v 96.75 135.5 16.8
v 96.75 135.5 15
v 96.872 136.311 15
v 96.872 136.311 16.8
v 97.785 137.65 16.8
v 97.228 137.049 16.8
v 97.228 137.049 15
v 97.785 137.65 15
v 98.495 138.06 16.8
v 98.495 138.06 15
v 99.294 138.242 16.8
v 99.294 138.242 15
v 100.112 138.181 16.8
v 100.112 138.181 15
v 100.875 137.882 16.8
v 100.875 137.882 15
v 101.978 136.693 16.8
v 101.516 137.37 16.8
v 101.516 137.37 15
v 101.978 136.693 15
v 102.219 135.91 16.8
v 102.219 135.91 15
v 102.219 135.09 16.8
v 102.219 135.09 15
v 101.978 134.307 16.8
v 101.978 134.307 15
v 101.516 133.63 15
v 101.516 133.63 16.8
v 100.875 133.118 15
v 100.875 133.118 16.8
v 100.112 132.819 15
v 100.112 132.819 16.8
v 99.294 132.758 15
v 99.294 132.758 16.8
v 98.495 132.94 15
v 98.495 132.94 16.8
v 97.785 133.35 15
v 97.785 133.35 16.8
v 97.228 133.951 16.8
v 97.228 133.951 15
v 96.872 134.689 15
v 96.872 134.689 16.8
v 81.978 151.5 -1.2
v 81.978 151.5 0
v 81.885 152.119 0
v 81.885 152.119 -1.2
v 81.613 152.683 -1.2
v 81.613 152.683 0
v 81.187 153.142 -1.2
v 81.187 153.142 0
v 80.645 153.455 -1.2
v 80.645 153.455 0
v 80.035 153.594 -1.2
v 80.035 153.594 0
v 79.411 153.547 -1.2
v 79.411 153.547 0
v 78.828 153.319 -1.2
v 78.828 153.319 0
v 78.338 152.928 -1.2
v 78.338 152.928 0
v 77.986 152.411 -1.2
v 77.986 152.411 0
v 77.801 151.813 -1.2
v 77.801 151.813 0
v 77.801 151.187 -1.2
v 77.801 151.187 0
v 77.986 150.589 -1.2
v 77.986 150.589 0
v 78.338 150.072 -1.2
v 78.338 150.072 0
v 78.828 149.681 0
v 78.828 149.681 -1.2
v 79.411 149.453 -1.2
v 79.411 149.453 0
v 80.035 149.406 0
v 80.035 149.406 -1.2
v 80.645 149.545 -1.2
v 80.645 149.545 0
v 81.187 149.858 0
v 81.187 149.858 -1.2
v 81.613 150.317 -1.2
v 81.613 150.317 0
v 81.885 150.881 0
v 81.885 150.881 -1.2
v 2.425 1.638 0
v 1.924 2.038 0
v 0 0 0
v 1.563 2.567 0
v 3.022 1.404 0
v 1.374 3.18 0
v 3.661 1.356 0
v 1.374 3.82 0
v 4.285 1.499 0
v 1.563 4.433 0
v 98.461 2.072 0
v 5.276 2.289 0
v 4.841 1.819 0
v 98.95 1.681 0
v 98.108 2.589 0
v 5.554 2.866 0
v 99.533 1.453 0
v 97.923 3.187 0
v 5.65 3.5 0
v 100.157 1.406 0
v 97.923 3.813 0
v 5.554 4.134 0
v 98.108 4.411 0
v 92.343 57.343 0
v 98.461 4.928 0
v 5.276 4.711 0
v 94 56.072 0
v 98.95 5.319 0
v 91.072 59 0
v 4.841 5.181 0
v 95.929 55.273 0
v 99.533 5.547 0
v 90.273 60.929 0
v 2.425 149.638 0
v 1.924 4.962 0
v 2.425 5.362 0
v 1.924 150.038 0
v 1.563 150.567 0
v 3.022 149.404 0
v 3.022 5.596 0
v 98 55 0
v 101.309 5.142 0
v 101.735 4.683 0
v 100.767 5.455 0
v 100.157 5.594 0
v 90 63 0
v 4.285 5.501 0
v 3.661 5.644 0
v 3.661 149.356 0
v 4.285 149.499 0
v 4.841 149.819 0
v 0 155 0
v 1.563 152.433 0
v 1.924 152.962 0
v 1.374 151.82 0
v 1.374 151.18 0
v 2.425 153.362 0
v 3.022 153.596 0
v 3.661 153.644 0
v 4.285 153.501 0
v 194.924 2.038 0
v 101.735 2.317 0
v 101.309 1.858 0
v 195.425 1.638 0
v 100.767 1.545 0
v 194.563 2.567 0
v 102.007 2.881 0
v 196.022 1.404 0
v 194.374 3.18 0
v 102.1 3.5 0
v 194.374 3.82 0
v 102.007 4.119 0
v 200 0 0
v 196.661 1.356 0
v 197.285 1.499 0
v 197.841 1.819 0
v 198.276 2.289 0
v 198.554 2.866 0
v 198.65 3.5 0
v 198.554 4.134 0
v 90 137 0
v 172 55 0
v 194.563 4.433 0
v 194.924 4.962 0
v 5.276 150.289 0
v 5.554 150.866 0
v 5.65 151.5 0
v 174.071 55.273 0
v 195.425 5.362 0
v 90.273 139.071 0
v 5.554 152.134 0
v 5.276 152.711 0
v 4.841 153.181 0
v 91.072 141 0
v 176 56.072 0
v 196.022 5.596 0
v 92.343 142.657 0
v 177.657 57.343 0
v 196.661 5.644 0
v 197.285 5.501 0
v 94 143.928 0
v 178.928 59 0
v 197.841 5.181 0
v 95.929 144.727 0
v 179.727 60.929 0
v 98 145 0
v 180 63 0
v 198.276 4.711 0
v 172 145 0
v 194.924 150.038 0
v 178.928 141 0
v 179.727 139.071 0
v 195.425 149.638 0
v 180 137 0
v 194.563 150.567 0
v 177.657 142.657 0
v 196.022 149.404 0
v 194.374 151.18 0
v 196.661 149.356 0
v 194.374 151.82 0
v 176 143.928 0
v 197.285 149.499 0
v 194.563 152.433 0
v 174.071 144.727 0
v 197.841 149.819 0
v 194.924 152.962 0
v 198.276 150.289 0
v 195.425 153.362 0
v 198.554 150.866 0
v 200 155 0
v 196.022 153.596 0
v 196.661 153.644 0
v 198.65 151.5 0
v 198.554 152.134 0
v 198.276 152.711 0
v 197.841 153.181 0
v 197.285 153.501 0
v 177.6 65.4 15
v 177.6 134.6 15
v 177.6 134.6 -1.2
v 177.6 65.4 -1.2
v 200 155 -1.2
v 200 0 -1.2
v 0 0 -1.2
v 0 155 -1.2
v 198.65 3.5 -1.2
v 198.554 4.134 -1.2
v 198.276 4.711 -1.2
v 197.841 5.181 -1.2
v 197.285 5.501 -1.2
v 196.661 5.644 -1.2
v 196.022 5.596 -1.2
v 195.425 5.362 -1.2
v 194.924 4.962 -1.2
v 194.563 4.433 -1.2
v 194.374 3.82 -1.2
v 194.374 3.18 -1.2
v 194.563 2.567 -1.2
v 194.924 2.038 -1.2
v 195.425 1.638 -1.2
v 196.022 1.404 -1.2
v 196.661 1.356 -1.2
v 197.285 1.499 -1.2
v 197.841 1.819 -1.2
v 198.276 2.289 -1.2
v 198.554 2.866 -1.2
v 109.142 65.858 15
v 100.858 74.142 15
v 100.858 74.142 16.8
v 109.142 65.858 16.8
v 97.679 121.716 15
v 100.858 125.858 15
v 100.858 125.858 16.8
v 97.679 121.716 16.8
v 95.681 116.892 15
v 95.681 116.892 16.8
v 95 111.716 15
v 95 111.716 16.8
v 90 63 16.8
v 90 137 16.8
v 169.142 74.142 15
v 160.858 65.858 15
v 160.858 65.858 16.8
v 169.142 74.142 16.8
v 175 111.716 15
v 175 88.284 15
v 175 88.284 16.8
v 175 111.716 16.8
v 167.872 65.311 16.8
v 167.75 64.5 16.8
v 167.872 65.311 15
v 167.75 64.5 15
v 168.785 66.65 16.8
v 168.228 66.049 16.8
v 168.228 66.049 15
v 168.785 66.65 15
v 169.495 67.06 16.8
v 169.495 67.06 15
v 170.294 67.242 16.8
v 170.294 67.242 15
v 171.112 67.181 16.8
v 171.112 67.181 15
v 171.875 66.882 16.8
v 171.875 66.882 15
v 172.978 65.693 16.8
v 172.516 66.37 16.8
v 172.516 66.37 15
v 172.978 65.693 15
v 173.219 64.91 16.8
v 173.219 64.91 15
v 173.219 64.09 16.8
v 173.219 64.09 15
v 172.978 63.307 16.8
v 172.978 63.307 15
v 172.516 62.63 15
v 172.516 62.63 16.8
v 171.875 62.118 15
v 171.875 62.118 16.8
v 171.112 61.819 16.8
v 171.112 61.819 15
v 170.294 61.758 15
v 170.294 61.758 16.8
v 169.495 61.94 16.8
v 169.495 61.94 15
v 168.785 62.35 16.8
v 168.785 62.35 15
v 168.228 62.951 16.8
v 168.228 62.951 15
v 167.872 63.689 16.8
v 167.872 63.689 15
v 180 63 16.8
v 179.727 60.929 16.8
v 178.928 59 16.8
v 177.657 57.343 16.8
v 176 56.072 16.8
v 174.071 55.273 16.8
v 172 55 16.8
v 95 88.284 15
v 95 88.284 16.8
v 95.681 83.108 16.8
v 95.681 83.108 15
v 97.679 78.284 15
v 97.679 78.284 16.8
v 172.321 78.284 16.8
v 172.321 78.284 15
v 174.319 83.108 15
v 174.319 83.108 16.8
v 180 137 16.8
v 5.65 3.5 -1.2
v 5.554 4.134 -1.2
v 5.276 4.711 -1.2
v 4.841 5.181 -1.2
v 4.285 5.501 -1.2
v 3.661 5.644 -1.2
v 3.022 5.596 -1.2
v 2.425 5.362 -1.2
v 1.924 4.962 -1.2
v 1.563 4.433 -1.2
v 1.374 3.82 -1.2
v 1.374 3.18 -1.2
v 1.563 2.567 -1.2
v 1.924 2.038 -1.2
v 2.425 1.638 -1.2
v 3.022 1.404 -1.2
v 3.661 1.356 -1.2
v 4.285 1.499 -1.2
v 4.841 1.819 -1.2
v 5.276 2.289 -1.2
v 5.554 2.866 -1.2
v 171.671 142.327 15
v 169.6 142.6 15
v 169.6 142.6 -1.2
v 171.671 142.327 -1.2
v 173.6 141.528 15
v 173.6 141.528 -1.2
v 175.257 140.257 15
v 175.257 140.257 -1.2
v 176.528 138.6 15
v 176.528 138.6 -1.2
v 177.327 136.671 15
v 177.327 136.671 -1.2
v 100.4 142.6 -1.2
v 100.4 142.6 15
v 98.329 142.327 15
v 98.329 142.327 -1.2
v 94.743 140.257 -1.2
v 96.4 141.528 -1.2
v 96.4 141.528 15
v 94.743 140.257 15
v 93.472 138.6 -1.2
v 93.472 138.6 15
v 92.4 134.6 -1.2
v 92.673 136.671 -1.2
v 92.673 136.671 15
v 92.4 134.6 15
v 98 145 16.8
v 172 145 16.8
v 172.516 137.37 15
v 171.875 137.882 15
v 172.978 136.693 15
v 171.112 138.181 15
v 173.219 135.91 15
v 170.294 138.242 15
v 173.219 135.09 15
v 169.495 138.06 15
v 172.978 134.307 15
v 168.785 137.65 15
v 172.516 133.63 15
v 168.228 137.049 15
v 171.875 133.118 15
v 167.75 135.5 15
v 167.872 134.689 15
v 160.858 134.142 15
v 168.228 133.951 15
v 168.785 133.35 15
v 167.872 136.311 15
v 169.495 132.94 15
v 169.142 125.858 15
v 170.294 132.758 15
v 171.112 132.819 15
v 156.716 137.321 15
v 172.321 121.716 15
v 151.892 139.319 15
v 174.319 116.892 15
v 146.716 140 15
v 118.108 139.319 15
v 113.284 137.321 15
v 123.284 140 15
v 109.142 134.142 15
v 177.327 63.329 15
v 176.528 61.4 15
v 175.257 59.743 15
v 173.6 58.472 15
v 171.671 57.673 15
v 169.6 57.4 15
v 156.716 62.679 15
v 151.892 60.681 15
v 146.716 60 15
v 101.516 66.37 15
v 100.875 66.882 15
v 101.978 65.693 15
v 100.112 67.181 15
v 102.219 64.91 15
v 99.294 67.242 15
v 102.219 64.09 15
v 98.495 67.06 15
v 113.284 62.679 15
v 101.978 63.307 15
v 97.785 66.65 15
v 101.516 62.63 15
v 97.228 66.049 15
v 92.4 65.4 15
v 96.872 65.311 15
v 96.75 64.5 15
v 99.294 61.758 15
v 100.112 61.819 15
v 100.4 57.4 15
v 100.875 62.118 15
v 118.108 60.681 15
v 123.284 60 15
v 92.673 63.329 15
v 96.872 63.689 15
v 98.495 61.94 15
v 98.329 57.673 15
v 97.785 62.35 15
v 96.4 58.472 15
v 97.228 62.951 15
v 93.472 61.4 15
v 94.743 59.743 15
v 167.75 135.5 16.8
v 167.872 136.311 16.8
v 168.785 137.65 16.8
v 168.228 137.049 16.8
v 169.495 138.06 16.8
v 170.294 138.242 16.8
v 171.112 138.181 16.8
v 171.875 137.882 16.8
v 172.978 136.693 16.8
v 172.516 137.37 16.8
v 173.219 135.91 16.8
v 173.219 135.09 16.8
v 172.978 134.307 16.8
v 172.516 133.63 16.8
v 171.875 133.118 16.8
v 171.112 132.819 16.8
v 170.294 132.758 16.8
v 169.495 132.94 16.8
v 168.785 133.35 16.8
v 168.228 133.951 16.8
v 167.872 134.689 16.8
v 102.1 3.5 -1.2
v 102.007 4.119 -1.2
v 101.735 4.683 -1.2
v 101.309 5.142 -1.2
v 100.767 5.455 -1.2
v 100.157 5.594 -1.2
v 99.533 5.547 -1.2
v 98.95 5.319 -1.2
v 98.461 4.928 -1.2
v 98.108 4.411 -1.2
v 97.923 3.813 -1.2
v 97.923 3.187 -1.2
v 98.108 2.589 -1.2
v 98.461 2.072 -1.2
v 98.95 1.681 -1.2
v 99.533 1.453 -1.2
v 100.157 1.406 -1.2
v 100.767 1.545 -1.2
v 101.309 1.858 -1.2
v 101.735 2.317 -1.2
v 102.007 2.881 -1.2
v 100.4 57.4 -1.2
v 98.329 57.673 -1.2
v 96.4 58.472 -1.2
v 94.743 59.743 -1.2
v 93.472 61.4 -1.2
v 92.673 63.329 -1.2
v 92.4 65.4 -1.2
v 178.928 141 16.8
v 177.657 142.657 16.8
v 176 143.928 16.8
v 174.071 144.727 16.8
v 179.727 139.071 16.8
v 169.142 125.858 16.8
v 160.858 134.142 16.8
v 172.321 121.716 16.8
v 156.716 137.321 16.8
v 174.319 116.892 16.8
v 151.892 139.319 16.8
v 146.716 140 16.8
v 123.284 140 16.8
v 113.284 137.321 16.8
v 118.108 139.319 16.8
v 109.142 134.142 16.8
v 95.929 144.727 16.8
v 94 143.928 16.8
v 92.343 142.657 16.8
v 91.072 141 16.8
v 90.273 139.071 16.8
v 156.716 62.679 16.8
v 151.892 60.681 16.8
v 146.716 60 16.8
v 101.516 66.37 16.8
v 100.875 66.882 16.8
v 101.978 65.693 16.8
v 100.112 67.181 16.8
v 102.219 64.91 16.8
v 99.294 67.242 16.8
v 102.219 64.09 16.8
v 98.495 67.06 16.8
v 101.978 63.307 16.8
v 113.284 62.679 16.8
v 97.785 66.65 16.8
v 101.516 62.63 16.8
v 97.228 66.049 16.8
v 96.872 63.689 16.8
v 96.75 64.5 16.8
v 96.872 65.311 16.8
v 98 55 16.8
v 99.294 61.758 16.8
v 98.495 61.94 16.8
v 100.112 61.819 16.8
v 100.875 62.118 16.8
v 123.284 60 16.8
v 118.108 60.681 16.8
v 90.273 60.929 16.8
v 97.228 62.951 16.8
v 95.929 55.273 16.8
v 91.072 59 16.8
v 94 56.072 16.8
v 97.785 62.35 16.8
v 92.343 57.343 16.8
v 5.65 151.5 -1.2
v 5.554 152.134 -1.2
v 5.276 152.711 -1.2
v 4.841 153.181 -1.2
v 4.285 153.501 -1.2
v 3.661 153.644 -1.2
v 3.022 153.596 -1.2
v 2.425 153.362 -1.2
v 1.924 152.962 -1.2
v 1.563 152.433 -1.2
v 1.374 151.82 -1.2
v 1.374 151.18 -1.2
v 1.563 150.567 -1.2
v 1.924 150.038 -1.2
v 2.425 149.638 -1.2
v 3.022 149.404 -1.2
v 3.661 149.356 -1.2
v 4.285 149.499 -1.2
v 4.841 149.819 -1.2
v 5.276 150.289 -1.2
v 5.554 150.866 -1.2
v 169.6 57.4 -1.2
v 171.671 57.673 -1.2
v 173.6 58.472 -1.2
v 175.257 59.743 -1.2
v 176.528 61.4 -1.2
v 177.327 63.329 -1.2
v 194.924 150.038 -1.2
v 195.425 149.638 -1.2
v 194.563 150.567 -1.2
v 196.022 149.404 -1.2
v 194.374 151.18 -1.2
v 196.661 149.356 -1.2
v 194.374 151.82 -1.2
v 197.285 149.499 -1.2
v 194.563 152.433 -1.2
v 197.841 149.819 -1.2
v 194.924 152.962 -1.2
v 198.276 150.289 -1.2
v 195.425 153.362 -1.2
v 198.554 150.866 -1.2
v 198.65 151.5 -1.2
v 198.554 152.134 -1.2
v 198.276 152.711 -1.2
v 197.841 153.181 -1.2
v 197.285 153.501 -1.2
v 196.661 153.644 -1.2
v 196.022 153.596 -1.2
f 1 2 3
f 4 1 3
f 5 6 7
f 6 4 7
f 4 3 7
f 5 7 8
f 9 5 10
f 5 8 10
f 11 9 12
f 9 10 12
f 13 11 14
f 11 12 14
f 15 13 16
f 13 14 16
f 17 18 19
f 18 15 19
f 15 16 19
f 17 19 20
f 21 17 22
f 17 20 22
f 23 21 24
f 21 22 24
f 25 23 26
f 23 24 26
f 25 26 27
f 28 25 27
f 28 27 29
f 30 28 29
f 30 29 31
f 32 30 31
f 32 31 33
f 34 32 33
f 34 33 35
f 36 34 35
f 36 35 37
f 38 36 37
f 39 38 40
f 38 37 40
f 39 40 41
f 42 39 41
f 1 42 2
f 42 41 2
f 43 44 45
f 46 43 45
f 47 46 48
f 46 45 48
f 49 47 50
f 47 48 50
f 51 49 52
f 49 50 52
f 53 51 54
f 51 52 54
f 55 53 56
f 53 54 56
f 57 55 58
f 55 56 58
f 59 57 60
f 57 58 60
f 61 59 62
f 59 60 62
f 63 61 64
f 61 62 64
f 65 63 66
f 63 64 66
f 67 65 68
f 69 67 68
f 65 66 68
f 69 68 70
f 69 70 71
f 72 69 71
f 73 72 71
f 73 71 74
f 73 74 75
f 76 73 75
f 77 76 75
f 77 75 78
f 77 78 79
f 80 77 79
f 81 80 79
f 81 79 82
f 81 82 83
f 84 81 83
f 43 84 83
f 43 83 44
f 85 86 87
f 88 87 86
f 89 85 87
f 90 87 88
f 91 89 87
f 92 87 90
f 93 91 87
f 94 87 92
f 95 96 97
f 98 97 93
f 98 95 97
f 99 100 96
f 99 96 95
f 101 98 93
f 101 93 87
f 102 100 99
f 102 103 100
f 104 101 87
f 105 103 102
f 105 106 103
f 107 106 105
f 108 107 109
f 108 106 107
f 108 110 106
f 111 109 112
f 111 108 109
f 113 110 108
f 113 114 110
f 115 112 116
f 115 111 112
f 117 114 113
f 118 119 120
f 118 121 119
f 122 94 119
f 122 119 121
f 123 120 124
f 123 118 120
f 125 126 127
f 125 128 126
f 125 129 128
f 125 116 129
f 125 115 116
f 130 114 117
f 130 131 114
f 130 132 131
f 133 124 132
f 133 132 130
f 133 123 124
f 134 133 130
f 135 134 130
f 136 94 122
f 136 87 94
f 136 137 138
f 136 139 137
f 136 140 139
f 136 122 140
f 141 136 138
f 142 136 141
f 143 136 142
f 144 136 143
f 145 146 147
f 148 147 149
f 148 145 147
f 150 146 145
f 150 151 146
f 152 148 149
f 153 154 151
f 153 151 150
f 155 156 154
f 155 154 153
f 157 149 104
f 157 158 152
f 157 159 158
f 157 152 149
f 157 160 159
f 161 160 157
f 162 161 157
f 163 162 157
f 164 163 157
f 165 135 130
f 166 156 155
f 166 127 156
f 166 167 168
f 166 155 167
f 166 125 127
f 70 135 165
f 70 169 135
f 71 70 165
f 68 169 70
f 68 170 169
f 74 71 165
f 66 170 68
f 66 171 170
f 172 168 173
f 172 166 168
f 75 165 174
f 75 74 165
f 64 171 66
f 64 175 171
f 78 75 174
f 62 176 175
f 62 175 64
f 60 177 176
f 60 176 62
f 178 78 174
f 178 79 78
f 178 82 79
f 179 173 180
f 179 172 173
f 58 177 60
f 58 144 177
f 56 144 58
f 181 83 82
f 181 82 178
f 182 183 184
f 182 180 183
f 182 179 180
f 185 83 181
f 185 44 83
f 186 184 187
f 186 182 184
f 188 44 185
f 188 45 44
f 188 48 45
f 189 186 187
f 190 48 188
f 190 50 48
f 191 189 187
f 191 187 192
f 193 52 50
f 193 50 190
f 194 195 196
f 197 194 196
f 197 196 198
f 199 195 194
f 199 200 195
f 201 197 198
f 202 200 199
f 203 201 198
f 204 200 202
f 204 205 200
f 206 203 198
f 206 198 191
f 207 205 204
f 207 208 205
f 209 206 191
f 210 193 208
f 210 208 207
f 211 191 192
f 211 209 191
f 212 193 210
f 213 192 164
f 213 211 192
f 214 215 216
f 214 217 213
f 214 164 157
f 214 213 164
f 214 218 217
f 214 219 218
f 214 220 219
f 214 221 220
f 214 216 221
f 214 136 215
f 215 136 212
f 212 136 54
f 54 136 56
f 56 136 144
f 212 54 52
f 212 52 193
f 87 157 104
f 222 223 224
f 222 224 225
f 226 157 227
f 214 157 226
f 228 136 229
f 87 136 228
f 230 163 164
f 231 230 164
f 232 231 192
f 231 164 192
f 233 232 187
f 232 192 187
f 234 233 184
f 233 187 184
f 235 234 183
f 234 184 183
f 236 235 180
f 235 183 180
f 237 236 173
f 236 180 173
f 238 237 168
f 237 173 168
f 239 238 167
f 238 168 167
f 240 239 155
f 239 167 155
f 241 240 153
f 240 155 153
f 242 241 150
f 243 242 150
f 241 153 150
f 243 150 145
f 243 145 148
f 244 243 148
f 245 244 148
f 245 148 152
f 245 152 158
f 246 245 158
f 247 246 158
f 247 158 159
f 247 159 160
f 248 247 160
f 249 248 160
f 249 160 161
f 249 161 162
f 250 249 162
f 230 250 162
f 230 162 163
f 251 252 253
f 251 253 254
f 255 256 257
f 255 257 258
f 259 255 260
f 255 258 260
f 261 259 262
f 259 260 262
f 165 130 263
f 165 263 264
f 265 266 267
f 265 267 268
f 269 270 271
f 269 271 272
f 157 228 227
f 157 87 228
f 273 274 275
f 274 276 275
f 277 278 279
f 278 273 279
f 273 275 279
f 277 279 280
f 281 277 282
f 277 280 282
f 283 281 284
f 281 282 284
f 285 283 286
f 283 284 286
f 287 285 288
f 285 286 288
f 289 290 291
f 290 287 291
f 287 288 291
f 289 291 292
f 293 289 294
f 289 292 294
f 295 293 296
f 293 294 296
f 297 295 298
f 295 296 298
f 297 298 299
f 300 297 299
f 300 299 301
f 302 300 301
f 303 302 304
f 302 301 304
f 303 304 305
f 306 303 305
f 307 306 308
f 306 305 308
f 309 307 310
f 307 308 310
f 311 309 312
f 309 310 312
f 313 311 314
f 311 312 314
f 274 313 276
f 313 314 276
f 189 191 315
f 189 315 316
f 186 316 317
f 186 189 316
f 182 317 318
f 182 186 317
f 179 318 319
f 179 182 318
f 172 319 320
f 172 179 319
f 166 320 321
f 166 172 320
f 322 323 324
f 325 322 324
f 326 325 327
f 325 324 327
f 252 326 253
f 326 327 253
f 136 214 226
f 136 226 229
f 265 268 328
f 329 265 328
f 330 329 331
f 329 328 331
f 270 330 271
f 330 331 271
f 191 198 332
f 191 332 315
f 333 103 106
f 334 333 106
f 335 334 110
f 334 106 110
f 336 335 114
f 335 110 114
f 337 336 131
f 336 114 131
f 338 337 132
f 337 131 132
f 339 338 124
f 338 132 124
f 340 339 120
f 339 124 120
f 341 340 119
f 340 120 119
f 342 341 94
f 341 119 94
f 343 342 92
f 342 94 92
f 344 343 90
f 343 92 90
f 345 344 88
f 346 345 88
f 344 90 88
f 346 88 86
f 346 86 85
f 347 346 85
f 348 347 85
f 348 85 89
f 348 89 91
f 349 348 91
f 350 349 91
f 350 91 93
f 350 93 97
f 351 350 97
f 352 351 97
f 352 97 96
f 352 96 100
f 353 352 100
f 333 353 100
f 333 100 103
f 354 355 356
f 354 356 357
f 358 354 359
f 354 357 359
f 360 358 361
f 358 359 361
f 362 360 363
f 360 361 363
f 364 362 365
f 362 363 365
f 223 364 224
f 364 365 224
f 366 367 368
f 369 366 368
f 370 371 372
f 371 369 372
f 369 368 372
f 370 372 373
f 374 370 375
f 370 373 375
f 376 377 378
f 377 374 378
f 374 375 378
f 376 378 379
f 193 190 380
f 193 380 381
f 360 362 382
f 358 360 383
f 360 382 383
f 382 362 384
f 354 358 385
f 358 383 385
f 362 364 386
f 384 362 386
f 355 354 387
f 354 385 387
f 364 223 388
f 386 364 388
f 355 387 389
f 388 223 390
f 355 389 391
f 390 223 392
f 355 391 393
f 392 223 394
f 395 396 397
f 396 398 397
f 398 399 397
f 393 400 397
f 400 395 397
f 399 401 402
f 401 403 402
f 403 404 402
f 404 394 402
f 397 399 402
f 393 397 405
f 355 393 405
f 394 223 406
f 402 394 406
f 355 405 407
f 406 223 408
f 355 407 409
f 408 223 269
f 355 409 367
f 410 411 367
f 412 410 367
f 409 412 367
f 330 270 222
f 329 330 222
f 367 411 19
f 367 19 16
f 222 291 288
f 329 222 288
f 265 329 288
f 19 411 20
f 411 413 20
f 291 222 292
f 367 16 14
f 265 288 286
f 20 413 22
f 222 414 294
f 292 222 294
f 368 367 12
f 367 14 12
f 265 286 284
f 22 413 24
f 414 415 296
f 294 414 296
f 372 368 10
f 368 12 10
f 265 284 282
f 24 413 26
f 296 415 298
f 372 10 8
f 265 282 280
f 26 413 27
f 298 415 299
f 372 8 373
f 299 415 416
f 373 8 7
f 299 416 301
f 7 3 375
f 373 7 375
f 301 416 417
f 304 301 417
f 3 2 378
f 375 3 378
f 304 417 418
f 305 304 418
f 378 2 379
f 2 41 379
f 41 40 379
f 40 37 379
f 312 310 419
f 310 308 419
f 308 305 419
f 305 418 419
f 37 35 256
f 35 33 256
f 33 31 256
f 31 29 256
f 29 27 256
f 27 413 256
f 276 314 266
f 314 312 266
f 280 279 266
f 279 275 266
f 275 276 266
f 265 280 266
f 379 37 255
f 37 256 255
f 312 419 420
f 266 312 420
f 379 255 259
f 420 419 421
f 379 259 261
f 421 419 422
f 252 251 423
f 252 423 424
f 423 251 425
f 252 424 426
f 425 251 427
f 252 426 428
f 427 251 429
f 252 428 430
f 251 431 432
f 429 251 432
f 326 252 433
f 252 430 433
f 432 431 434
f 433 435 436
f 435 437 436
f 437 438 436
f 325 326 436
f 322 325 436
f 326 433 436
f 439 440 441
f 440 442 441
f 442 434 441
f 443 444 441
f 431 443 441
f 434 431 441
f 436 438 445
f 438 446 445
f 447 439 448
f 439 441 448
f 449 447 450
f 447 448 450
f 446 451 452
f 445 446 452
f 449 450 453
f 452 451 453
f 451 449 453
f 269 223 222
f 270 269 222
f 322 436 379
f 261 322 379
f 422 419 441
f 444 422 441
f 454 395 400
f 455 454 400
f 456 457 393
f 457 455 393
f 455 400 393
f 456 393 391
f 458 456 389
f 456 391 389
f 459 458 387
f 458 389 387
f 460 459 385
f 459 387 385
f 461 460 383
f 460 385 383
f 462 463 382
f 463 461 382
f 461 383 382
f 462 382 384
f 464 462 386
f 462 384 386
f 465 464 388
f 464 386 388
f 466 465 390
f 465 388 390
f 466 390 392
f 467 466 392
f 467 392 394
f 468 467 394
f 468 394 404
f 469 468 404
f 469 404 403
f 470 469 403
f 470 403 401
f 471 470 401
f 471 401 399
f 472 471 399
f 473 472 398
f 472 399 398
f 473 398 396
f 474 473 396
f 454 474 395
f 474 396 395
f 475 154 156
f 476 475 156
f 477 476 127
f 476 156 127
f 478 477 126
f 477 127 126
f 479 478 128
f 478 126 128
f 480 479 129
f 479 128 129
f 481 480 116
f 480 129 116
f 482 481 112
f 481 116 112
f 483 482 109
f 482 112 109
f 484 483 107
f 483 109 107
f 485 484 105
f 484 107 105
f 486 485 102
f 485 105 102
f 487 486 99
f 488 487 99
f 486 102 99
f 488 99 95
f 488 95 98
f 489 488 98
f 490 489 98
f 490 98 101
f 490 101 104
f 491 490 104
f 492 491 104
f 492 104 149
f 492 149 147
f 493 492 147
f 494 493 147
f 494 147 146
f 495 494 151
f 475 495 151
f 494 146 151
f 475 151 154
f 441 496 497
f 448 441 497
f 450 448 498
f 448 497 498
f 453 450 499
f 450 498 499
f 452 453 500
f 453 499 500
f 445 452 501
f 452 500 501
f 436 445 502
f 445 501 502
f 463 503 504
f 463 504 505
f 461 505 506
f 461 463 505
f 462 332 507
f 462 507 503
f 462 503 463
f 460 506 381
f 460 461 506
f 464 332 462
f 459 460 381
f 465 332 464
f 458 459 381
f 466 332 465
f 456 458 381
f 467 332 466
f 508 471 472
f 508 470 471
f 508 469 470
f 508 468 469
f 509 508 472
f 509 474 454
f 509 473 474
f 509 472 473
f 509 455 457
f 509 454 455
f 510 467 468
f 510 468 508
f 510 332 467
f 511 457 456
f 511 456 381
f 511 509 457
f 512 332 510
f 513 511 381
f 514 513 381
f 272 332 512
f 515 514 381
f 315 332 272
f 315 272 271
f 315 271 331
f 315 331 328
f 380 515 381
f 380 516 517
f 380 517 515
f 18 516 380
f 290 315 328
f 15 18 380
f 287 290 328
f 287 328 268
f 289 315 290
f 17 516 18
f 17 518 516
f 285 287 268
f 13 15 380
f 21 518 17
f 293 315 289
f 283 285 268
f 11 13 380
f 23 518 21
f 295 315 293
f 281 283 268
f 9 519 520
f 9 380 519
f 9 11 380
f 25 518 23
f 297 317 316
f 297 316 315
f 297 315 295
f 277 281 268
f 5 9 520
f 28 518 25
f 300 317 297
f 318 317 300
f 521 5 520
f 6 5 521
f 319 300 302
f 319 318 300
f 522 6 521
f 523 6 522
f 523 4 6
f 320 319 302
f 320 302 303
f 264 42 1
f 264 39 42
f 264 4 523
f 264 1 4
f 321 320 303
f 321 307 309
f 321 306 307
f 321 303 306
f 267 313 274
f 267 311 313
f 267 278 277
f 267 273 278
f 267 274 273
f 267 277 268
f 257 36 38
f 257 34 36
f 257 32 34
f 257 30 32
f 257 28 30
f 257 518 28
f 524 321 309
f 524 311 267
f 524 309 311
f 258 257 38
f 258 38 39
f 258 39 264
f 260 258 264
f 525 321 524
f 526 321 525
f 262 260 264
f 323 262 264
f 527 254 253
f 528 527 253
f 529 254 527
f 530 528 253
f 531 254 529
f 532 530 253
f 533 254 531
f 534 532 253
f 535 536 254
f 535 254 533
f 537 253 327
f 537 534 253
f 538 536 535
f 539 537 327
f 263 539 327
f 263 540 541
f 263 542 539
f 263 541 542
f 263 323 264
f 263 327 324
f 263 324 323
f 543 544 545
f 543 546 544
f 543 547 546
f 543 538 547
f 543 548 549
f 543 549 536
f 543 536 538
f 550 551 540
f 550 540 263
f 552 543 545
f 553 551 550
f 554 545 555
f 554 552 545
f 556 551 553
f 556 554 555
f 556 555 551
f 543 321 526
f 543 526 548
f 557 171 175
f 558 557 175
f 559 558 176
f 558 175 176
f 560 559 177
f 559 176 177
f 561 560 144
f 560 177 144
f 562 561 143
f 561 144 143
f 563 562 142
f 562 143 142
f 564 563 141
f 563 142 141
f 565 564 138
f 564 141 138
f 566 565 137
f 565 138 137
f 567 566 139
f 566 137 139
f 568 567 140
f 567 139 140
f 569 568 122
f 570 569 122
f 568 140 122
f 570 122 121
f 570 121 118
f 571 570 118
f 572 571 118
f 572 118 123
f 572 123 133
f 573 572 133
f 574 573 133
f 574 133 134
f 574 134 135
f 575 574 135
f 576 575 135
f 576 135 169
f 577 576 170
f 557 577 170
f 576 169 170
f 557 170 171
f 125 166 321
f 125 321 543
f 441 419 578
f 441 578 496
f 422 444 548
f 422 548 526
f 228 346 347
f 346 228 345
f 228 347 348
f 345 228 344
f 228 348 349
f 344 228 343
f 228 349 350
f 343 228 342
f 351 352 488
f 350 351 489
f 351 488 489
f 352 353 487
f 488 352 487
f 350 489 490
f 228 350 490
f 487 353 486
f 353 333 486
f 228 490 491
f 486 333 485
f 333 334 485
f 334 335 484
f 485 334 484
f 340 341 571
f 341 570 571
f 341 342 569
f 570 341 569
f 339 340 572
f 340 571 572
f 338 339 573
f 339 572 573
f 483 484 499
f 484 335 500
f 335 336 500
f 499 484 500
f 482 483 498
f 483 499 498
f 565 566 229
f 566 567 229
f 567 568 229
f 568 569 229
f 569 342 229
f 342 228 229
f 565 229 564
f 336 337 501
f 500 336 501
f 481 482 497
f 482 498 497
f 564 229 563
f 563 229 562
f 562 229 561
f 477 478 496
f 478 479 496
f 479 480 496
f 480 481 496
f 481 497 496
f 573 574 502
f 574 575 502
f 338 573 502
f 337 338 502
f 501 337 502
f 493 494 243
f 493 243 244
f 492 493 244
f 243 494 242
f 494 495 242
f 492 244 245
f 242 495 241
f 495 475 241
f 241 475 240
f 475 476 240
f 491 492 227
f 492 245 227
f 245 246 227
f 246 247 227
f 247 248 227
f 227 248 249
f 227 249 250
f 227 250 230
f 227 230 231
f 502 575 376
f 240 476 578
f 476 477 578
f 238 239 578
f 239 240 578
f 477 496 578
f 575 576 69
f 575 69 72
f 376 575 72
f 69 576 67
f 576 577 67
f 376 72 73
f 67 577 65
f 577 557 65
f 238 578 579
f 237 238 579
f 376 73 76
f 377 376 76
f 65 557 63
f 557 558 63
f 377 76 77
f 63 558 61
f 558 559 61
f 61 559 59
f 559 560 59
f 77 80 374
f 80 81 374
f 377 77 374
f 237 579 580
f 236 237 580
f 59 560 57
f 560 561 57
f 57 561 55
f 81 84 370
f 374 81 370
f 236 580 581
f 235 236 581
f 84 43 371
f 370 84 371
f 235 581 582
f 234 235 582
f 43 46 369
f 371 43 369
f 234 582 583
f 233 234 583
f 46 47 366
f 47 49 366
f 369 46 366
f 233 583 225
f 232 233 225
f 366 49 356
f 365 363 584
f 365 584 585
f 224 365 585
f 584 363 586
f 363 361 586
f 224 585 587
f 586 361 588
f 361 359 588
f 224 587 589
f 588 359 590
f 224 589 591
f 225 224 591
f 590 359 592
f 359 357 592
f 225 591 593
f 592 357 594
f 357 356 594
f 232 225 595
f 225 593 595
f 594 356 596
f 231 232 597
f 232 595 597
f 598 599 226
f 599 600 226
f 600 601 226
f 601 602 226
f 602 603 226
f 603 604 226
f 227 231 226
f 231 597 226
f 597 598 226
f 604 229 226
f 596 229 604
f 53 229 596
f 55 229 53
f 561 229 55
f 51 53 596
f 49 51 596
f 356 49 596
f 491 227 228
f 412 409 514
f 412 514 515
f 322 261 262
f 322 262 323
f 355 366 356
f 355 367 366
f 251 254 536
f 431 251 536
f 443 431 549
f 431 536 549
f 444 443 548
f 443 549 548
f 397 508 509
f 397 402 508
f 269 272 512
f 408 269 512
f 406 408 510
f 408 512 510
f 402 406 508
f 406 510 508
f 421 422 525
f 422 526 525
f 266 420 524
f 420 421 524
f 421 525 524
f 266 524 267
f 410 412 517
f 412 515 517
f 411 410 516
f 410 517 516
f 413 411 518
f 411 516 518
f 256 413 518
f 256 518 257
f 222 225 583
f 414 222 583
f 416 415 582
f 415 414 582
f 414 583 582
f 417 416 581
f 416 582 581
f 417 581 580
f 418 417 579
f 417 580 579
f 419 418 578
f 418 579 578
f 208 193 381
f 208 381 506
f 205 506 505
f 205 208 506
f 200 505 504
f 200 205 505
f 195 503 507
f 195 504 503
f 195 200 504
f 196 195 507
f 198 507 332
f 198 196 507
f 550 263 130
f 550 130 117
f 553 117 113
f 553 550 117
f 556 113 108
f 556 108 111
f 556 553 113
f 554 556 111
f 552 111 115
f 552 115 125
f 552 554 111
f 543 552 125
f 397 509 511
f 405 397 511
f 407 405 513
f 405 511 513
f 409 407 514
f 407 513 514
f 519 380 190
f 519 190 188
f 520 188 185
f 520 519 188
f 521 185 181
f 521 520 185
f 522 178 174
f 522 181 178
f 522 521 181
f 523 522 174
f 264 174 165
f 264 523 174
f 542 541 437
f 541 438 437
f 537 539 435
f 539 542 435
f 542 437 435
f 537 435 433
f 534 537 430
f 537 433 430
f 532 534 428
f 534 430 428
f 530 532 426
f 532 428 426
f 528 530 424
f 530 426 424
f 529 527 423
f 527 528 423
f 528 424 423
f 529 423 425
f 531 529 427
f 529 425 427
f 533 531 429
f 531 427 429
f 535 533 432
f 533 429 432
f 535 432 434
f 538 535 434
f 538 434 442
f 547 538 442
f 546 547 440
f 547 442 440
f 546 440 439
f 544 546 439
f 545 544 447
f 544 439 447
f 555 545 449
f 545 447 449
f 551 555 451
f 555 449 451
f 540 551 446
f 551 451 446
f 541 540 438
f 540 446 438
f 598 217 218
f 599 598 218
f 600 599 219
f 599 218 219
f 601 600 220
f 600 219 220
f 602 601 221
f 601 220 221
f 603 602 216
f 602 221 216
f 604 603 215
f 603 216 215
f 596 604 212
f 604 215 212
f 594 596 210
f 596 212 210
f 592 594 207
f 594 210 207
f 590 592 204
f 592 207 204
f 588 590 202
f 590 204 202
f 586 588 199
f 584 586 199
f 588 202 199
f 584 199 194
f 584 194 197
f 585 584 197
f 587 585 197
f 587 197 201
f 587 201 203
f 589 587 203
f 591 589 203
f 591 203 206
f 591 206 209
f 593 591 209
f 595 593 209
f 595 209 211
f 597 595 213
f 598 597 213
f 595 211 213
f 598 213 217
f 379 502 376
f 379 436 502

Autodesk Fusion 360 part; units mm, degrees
sketch "Sketch1" plane through (0, 0, 0) normal (0, 0, 1) x (1, 0, 0)
  line L0 (0, 0) -> (200, 0)
  line L1 (200, 0) -> (200, 155)
  line L2 (200, 155) -> (0, 155)
  line L3 (0, 155) -> (0, 0)
  line L4 (135, 100) -> (135, 145) construction
  line L5 (135, 100) -> (135, 55) construction
  circle A0 centre (135, 100) radius 40 construction
  line L6 (135, 100) -> (90, 100) construction
  line L7 (135, 100) -> (180, 100) construction
  line L8 (90, 145) -> (180, 145) construction
  line L9 (180, 145) -> (180, 55) construction
  line L10 (180, 55) -> (90, 55) construction
  line L11 (90, 55) -> (90, 145) construction
  line L12 (90, 145) -> (92.4, 145) construction
  line L13 (92.4, 145) -> (92.4, 142.6) construction
  line L14 (92.4, 142.6) -> (90, 142.6) construction
  line L15 (90, 142.6) -> (90, 145) construction
  line L16 (180, 55) -> (177.6, 55) construction
  line L17 (177.6, 55) -> (177.6, 57.4) construction
  line L18 (177.6, 57.4) -> (180, 57.4) construction
  line L19 (180, 57.4) -> (180, 55) construction
  line L20 (90, 145) -> (180, 145)
  line L21 (180, 145) -> (180, 55)
  line L22 (180, 55) -> (90, 55)
  line L23 (90, 55) -> (90, 145)
  line L24 (92.4, 142.6) -> (177.6, 142.6)
  line L25 (177.6, 142.6) -> (177.6, 57.4)
  line L26 (177.6, 57.4) -> (92.4, 57.4)
  line L27 (92.4, 57.4) -> (92.4, 142.6)
  dimension "d1" = 200
  dimension "d2" = 155
  dimension "d5" = 2.4
  dimension "d6" = 2.4
  dimension "d7" = 2.4
  dimension "d8" = 2.4
extrude "Extrude1" add sketch "Sketch1" against normal blind 1.2 contours L0 L1 L2 L3 makes body 1
extrude "Extrude2" add sketch "Sketch1" along normal blind 15 separate body contours L20 L21 L22 L23 makes body 2
sketch "Sketch2" plane through (0, 0, 15) normal (0, 0, 1) x (-1, 0, 0)
  line L0 (-177.6, -57.4) -> (-92.4, -57.4)
  line L1 (-92.4, -57.4) -> (-92.4, -142.6)
  line L2 (-92.4, -142.6) -> (-177.6, -142.6)
  line L3 (-177.6, -142.6) -> (-177.6, -57.4)
  line L4 (-90, -55) -> (-180, -55)
  line L5 (-180, -55) -> (-180, -145)
  line L6 (-180, -145) -> (-90, -145)
  line L7 (-90, -145) -> (-90, -55)
  line L8 (-95, -140) -> (-99.5, -140) construction
  line L9 (-99.5, -140) -> (-99.5, -135.5) construction
  line L10 (-99.5, -135.5) -> (-95, -135.5) construction
  line L11 (-95, -135.5) -> (-95, -140) construction
  line L12 (-175, -60) -> (-170.5, -60) construction
  line L13 (-170.5, -60) -> (-170.5, -64.5) construction
  line L14 (-170.5, -64.5) -> (-175, -64.5) construction
  line L15 (-175, -64.5) -> (-175, -60) construction
  line L16 (-99.5, -135.5) -> (-170.5, -135.5) construction
  line L17 (-170.5, -135.5) -> (-170.5, -64.5) construction
  line L18 (-170.5, -64.5) -> (-99.5, -64.5) construction
  line L19 (-99.5, -64.5) -> (-99.5, -135.5) construction
  circle A0 centre (-99.5, -135.5) radius 2.75
  circle A1 centre (-170.5, -135.5) radius 2.75
  circle A2 centre (-99.5, -64.5) radius 2.75
  circle A3 centre (-170.5, -64.5) radius 2.75
  line L20 (-115, -140) -> (-95, -120)
  line L21 (-95, -120) -> (-95, -80)
  line L22 (-95, -80) -> (-115, -60)
  line L23 (-115, -60) -> (-155, -60)
  line L24 (-155, -60) -> (-175, -80)
  line L25 (-175, -80) -> (-175, -120)
  line L26 (-175, -120) -> (-155, -140)
  line L27 (-155, -140) -> (-115, -140)
  line L28 (-90, -145) -> (-180, -145)
  line L29 (-180, -145) -> (-180, -55)
  line L30 (-180, -55) -> (-90, -55)
  line L31 (-90, -55) -> (-90, -145)
  dimension "d13" = 4.5
  dimension "d14" = 4.5
  dimension "d15" = 4.5
  dimension "d16" = 4.5
  dimension "d17" = 5.5
  dimension "d18" = 5.5
  dimension "d19" = 5.5
  dimension "d20" = 5.5
extrude "Extrude3" add sketch "Sketch2" along normal blind 1.8 contours L0 L1 L2 L3 | L4 L5 L6 L7 L28 L29 L30 L31 bodies 2
fillet "Fillet1" radius 20 8 edges at (95, 80, 15.9) (115, 60, 15.9) (155, 60, 15.9) (175, 80, 15.9) (175, 120, 15.9) (155, 140, 15.9) (115, 140, 15.9) (95, 120, 15.9) on bodies 2
sketch "Sketch3" plane through (0, 0, 0) normal (0, 0, 1) x (1, 0, 0)
extrude "Extrude4" add sketch "Sketch1" against normal blind 1.2 contours L20 L21 L22 L23 bodies 1 2
fillet "Fillet2" radius 8 4 edges at (92.4, 142.6, 6.9) (177.6, 142.6, 6.9) (177.6, 57.4, 6.9) (92.4, 57.4, 6.9) on bodies 1
fillet "Fillet3" radius 8 4 edges at (90, 145, 8.4) (90, 55, 8.4) (180, 55, 8.4) (180, 145, 8.4) on bodies 1
sketch "Sketch4" plane through (0, 0, 0) normal (0, 0, 1) x (1, 0, 0)
  line L0 (200, 155) -> (196.5, 155) construction
  line L1 (196.5, 155) -> (196.5, 151.5) construction
  line L2 (196.5, 151.5) -> (200, 151.5) construction
  line L3 (200, 151.5) -> (200, 155) construction
  line L4 (0, 0) -> (3.5, 0) construction
  line L5 (3.5, 0) -> (3.5, 3.5) construction
  line L6 (3.5, 3.5) -> (0, 3.5) construction
  line L7 (0, 3.5) -> (0, 0) construction
  line L8 (3.5, 3.5) -> (196.5, 3.5) construction
  line L9 (196.5, 3.5) -> (196.5, 151.5) construction
  line L10 (196.5, 151.5) -> (3.5, 151.5) construction
  line L11 (3.5, 151.5) -> (3.5, 3.5) construction
  circle A0 centre (3.5, 151.5) radius 2.15
  circle A1 centre (3.5, 3.5) radius 2.15
  circle A2 centre (196.5, 151.5) radius 2.15
  circle A3 centre (196.5, 3.5) radius 2.15
  circle A4 centre (79.8779, 151.5) radius 2.1
  circle A5 centre (100, 3.5) radius 2.1
  dimension "d31" = 3.5
  dimension "d32" = 3.5
  dimension "d33" = 3.5
  dimension "d34" = 3.5
  dimension "d35" = 4.3
  dimension "d36" = 4.3
  dimension "d37" = 4.3
  dimension "d38" = 4.3
  dimension "d41" = 4.2
  dimension "d42" = 4.2
extrude "Extrude5" cut sketch "Sketch4" against normal blind 1.2 contours A0 | A1 | A2 | A3 bodies 1
extrude "Extrude6" cut sketch "Sketch4" against normal blind 1.2 contours A4 | A5 bodies 1
copy_body "Body->Comp1" bodies 1 removing the originals makes body 3 in component "Component"
component "Component" placed x (1, 0, 0) y (0, 1, 0) z (0, 0, 1) at (0, 0, 0)
